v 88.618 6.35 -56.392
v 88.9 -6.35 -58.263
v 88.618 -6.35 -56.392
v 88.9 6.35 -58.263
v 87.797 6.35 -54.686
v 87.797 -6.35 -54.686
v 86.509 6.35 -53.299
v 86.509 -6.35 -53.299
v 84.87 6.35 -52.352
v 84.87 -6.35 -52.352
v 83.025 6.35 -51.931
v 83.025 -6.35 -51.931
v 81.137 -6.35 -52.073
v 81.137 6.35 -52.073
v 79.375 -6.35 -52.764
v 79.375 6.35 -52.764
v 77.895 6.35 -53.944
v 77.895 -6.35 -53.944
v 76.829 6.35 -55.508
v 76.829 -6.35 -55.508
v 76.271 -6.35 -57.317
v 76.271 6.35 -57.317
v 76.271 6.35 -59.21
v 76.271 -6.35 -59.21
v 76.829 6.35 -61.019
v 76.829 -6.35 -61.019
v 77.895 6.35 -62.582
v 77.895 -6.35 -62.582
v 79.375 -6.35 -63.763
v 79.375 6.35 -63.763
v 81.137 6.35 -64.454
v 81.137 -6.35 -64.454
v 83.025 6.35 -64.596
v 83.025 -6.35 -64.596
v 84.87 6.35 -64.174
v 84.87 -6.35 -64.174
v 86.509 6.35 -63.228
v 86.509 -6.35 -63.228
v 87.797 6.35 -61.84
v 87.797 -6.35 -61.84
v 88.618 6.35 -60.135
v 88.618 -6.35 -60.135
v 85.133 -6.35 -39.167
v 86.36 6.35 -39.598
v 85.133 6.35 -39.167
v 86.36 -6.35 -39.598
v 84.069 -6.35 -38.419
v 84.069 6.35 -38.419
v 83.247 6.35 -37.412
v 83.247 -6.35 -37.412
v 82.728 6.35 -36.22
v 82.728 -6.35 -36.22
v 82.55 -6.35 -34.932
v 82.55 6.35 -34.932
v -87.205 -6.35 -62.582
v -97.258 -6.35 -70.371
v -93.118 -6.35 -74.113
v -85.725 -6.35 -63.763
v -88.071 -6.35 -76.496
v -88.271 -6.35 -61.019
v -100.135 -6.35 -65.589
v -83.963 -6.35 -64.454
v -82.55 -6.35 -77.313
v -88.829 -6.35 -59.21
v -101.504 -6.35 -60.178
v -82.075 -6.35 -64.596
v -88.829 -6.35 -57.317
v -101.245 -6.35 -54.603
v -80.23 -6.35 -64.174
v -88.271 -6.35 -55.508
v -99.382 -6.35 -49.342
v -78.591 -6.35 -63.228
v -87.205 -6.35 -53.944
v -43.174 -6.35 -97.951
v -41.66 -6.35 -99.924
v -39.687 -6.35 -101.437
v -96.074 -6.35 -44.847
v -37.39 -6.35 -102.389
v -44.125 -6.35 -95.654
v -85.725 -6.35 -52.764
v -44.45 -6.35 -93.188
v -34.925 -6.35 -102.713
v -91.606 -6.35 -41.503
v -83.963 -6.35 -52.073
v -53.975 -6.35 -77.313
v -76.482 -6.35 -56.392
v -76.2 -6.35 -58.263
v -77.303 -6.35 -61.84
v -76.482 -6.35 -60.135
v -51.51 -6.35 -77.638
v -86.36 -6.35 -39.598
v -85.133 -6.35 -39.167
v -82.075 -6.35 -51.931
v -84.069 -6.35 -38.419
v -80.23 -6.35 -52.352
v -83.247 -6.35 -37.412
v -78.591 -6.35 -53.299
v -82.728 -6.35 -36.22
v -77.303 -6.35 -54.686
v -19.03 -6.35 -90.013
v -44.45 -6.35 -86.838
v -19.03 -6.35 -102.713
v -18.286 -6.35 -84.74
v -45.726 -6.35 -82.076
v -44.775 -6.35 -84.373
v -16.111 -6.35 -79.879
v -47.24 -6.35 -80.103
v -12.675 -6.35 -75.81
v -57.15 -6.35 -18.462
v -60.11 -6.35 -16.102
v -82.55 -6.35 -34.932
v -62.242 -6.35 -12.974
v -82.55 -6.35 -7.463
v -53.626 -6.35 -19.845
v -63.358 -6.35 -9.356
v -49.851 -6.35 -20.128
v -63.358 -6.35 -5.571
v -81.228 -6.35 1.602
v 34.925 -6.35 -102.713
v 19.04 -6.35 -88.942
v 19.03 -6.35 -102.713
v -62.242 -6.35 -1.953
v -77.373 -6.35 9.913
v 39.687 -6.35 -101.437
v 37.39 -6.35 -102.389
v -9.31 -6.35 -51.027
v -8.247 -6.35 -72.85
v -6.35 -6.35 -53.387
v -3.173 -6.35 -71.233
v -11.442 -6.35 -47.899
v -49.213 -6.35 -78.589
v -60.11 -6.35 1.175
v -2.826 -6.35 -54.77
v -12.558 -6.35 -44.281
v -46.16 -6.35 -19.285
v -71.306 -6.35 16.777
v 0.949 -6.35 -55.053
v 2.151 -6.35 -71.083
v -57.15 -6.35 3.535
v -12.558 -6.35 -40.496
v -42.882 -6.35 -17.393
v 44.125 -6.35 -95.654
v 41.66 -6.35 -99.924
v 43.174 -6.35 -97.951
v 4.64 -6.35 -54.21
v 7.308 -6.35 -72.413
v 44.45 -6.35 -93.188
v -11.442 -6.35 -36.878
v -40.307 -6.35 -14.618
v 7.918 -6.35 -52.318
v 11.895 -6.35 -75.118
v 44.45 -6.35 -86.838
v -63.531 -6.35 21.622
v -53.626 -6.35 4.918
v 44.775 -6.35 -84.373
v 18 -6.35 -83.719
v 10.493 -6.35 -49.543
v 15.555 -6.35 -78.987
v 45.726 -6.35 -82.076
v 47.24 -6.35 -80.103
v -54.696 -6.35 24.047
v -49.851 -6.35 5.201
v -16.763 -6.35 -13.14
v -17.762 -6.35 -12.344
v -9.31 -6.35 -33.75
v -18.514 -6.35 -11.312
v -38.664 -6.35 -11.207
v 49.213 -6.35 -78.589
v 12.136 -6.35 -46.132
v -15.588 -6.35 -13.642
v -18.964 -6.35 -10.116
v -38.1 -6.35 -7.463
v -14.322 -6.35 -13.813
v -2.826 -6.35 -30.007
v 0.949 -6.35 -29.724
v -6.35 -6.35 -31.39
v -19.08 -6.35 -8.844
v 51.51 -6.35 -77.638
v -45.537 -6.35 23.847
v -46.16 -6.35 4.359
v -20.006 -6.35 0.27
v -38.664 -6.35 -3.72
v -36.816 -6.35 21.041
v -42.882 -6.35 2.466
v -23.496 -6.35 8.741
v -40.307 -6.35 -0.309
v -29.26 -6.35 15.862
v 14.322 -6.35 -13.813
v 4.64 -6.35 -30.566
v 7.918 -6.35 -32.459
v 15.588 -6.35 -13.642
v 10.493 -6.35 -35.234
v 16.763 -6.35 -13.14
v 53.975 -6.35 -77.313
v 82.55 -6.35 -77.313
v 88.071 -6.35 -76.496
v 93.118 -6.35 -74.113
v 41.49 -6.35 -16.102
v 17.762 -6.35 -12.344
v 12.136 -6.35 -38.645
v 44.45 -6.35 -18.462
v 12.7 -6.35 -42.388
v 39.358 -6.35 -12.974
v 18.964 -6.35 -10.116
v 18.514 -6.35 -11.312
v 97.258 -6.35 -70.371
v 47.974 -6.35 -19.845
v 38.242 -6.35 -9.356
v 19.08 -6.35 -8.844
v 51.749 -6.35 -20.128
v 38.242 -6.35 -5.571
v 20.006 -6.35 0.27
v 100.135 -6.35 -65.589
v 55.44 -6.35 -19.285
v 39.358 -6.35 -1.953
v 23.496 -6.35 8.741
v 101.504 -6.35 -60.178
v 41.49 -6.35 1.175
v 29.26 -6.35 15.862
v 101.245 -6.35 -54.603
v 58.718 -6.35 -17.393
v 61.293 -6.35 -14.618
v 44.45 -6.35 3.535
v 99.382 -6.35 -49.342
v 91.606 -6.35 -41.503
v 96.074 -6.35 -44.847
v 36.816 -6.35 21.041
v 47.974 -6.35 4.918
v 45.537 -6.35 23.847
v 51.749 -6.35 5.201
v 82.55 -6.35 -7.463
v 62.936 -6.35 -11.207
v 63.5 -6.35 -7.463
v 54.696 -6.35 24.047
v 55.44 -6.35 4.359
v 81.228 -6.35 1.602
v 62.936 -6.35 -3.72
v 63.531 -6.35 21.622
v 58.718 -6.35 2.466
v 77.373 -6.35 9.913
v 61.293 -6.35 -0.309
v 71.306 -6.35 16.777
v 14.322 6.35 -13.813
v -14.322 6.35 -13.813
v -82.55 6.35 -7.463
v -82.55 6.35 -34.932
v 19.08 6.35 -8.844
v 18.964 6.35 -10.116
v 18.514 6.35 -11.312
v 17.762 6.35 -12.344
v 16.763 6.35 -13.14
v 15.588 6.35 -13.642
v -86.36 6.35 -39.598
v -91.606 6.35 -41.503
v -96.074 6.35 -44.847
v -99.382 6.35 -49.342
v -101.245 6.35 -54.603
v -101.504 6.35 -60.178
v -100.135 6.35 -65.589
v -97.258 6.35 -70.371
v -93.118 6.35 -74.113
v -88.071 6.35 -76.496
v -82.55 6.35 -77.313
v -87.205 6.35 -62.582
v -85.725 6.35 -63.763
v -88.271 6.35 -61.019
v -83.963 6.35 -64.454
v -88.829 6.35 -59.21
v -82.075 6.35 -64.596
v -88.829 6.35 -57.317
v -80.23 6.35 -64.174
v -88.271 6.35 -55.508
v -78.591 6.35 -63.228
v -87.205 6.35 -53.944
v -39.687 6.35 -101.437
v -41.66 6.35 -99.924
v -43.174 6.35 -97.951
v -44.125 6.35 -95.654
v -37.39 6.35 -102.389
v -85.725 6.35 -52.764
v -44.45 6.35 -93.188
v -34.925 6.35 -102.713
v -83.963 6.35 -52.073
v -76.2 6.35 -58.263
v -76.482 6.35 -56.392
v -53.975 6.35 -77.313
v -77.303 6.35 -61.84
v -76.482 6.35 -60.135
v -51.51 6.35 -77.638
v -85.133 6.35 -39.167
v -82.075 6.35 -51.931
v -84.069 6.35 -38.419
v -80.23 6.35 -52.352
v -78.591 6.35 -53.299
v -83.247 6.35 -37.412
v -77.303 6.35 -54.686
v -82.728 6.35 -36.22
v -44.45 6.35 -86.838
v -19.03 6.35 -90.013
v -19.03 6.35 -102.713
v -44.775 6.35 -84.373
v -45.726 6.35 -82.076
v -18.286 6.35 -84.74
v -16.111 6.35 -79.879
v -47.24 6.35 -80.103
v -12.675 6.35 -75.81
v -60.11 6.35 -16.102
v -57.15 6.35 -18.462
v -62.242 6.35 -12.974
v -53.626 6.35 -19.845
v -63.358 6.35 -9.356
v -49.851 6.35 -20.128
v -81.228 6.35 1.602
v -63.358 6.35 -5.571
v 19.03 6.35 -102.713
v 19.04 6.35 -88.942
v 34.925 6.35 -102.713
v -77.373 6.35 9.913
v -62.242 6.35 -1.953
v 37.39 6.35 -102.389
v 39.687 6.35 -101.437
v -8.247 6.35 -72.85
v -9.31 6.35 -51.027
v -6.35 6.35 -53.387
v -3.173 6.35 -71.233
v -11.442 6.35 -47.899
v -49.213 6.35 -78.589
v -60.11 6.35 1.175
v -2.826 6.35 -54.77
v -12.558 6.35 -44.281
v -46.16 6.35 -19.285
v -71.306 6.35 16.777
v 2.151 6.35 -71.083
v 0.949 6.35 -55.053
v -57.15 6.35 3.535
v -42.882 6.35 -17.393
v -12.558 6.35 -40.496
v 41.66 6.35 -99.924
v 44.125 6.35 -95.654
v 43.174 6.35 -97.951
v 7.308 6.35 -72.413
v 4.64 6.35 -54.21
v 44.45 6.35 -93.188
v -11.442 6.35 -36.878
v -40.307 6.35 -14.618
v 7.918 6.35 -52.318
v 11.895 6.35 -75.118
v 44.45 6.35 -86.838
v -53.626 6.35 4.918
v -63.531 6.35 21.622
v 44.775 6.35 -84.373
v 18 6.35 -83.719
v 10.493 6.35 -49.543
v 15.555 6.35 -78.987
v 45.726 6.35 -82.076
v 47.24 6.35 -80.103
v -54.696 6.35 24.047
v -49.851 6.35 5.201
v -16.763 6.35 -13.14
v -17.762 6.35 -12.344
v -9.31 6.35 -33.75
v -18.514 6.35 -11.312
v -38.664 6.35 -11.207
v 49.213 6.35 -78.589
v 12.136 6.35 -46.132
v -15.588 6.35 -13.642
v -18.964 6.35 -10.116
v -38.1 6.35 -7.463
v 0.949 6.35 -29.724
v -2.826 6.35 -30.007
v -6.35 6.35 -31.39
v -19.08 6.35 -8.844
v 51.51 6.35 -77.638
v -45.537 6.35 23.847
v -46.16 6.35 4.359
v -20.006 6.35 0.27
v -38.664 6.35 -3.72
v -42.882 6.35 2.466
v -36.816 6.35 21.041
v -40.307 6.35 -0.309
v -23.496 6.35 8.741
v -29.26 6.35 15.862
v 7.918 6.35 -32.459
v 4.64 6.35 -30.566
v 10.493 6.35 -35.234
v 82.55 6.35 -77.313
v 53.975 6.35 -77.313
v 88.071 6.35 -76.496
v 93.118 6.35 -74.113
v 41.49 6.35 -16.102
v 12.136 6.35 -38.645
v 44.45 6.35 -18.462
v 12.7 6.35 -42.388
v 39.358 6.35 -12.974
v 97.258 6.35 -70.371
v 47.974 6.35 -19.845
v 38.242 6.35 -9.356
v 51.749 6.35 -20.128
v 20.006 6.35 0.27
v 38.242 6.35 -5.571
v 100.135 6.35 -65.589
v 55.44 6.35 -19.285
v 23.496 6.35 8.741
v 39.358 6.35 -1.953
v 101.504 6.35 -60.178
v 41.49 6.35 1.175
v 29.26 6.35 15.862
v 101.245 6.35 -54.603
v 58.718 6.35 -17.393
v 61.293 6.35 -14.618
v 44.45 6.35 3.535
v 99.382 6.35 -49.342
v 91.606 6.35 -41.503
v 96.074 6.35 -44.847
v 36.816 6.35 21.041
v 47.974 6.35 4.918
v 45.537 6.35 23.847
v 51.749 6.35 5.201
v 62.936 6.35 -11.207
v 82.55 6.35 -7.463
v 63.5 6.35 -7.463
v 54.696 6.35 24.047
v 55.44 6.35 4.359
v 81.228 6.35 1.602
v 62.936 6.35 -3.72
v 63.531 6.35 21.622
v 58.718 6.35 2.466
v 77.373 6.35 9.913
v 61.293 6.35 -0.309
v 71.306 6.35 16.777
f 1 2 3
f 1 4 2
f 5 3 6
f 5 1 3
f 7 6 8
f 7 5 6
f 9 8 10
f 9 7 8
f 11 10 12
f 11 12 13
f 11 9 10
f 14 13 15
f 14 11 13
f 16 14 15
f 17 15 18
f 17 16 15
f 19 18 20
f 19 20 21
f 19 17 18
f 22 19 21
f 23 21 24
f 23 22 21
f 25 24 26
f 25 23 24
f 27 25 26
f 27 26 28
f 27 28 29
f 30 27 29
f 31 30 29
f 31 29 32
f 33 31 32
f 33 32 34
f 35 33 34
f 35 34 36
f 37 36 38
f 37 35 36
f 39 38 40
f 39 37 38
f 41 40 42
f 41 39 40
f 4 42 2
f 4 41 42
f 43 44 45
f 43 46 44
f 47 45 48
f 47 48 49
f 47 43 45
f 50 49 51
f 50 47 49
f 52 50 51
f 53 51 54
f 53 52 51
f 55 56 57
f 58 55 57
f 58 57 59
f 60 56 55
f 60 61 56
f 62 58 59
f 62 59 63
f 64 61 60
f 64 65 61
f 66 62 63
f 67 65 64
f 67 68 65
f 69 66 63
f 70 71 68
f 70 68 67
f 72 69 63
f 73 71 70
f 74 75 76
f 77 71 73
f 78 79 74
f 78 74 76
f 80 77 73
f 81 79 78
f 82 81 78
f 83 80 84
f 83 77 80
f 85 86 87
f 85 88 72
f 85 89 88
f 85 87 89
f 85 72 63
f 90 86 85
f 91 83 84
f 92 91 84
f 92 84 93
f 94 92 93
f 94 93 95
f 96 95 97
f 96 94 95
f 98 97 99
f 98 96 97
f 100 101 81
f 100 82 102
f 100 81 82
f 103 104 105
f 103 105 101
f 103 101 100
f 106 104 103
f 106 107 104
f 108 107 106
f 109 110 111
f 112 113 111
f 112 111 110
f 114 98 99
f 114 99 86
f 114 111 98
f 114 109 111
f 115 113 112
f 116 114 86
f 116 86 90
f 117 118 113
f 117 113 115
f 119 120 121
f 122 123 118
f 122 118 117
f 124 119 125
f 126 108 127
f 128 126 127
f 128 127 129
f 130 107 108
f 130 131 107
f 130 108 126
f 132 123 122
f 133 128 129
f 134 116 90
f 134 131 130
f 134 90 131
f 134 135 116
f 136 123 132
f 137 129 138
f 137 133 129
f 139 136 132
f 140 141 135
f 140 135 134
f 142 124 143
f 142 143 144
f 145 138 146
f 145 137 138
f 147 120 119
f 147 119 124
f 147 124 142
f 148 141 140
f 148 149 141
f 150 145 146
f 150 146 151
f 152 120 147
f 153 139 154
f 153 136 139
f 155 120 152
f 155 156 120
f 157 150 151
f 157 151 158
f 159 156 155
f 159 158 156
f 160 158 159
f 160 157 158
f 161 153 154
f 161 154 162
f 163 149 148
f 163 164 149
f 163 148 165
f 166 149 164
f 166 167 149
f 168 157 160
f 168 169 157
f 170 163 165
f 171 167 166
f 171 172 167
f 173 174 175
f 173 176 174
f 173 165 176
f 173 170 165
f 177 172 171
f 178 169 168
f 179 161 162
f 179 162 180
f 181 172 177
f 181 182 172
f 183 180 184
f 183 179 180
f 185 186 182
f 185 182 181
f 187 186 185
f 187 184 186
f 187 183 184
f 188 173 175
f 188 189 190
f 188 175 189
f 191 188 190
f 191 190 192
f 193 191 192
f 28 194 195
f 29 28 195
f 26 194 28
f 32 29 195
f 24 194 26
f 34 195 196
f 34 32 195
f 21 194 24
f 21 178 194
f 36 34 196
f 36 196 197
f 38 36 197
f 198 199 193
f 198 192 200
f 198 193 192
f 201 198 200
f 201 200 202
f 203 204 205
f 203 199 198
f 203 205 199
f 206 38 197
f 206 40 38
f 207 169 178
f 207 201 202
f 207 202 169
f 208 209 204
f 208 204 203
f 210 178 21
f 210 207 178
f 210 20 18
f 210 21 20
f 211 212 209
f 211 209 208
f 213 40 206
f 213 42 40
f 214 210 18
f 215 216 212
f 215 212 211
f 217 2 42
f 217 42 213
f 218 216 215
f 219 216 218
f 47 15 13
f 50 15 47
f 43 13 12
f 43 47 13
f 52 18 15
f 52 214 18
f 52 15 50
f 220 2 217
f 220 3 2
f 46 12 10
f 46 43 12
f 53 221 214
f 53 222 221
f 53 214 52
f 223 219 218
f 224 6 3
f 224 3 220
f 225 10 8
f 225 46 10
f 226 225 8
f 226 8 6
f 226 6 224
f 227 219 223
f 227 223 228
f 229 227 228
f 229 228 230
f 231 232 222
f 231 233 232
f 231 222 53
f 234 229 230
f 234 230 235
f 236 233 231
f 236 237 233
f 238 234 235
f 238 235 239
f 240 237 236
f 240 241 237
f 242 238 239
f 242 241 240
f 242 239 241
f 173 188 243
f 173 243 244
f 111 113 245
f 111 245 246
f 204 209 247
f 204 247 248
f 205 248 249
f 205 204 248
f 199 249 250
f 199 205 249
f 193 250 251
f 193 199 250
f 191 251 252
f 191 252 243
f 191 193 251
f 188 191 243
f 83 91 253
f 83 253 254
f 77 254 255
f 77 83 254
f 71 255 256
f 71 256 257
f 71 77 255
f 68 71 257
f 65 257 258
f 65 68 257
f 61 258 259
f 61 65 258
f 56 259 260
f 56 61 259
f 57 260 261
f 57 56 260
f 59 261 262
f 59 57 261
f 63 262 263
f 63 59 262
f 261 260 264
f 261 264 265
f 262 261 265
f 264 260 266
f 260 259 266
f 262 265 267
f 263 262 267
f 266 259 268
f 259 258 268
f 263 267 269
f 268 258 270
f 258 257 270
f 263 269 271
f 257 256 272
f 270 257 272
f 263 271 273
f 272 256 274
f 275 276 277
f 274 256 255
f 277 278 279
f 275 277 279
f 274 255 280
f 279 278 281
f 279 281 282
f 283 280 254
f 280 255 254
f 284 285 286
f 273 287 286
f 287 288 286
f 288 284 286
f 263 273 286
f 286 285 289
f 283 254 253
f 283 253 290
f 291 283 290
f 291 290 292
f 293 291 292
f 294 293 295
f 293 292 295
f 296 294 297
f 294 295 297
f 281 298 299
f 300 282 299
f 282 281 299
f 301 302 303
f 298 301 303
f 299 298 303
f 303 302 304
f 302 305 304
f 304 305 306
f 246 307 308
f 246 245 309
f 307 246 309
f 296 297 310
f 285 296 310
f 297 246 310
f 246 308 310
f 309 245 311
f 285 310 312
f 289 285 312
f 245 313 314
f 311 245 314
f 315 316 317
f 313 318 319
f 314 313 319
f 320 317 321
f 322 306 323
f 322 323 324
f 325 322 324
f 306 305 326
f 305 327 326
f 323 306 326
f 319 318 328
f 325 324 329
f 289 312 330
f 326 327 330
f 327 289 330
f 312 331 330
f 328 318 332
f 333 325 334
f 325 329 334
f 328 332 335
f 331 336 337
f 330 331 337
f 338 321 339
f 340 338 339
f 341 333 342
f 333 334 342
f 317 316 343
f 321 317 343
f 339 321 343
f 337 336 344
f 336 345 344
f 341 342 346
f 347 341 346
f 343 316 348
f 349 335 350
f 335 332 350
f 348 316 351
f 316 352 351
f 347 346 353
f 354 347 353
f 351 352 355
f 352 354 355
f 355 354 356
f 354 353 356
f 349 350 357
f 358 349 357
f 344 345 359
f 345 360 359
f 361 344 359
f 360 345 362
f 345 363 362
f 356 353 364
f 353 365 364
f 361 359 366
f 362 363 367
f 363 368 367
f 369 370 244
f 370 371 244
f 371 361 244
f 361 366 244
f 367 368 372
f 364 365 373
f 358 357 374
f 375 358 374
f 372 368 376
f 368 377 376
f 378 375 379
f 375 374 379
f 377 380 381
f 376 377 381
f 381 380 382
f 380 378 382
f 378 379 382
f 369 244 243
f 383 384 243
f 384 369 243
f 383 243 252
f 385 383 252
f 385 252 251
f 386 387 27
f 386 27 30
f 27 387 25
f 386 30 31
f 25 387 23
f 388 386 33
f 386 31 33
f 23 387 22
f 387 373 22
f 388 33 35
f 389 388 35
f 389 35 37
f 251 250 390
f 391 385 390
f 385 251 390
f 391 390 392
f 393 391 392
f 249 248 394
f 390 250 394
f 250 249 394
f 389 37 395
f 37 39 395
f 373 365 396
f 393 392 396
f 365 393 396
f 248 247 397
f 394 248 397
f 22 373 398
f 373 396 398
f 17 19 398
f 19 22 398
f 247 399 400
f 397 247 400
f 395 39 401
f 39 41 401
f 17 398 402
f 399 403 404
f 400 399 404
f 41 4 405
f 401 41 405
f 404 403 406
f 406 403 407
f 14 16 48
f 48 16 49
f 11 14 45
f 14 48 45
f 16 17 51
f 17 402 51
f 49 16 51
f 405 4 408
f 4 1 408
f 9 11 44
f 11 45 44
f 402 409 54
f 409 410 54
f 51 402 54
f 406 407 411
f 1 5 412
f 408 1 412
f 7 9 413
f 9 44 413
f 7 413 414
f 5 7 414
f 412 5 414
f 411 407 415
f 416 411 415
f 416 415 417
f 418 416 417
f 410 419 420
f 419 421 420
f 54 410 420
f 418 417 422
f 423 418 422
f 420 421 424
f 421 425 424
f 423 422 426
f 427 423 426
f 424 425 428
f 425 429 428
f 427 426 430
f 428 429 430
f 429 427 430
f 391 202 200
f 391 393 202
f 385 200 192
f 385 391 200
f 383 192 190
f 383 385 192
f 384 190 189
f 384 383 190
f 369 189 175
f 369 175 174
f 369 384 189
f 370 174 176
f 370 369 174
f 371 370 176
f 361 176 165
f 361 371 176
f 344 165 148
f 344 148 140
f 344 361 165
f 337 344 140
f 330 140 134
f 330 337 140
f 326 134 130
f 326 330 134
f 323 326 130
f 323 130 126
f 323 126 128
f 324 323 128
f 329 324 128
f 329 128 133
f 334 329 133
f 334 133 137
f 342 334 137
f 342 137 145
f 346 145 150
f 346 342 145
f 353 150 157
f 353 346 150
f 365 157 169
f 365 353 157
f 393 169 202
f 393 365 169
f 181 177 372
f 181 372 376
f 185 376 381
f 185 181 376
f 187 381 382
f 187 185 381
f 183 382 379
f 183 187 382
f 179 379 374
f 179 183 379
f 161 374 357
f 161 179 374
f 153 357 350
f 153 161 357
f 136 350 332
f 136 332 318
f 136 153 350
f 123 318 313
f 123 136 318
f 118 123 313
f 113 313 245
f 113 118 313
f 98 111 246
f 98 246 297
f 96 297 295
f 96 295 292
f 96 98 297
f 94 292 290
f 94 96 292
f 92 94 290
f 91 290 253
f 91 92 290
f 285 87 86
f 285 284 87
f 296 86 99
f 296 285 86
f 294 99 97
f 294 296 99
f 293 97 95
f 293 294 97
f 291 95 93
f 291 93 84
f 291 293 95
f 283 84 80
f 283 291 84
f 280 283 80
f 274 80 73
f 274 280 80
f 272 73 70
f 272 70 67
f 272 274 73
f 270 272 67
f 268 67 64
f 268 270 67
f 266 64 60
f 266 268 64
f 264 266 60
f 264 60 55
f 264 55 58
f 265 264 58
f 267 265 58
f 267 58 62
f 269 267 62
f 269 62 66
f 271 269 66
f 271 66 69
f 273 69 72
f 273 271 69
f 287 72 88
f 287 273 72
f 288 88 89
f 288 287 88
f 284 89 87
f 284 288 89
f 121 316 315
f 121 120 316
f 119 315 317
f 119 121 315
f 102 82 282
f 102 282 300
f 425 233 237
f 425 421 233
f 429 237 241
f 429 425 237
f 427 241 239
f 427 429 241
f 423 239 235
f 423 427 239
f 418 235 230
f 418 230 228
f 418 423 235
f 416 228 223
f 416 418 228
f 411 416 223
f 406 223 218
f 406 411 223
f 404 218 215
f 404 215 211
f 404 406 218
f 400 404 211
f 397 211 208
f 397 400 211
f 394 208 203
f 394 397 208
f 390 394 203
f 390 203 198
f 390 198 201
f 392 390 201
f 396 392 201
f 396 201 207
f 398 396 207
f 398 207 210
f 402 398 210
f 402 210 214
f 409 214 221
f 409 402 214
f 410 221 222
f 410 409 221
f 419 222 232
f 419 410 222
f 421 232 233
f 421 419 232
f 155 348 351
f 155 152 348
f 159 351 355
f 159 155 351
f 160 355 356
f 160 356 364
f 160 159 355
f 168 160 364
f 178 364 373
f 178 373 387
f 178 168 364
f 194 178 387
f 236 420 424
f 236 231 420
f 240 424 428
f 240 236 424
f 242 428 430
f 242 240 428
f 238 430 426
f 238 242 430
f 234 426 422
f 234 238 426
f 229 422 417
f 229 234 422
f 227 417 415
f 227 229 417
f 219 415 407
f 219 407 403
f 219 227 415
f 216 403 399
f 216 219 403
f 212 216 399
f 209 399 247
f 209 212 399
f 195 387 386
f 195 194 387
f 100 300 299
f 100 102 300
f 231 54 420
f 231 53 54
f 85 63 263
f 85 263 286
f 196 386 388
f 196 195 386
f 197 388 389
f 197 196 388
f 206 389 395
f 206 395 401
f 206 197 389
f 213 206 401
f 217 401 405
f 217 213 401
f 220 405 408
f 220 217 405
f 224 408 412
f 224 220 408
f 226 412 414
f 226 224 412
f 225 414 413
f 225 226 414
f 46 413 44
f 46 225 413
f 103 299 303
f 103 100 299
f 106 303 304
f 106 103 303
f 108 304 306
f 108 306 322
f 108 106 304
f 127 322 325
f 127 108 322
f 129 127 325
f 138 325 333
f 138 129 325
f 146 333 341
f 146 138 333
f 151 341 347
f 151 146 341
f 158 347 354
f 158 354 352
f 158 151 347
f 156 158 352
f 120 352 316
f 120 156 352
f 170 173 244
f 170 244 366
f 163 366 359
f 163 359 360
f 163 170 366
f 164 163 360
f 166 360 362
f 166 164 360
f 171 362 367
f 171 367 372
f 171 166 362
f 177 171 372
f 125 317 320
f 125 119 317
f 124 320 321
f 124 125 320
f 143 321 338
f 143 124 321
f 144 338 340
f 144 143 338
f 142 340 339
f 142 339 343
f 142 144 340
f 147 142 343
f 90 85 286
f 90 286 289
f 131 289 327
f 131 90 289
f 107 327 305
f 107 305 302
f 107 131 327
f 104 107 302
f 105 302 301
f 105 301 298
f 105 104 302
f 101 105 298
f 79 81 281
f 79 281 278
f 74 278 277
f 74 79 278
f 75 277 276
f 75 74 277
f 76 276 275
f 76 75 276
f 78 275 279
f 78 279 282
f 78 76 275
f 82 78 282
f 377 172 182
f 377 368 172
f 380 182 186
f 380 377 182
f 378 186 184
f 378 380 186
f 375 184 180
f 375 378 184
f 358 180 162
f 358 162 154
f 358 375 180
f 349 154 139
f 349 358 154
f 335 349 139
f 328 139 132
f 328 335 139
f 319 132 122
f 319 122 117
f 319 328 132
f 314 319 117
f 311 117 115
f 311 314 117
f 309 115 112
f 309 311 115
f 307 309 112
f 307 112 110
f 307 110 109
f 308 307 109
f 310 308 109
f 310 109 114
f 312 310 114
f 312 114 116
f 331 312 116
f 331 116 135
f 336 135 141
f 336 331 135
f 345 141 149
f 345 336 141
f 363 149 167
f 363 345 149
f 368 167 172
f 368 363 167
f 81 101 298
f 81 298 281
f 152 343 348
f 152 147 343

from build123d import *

# Parameters (mm, degrees)
F0_R     = 7.9375
F0_R_2   = 12.7
F0_R_3   = 6.35
F1_DEPTH = 6.35


with BuildPart() as f1:
    # F0 (on Front) → F1 (new body, symmetric)
    with BuildSketch(Plane.XZ):
        with BuildLine():
            ThreePointArc((82.55, -7.463384), (50.109619, 24.279109), (19.080024, -8.843819))
            ThreePointArc((19.080024, -8.843819), (17.762053, -12.344458), (14.322027, -13.813384))
            Line((14.322027, -13.813384), (0, -13.813384))
            Line((0, -13.813384), (-14.322027, -13.813384))
            ThreePointArc((-14.322027, -13.813384), (-17.762053, -12.344458), (-19.080024, -8.843819))
            ThreePointArc((-19.080024, -8.843819), (-50.109619, 24.279109), (-82.55, -7.463384))
            Line((-82.55, -7.463384), (-82.55, -34.931994))
            ThreePointArc((-82.55, -34.931994), (-83.623483, -37.944063), (-86.36, -39.598272))
            ThreePointArc((-86.36, -39.598272), (-101.503534, -60.17808), (-82.55, -77.313384))
            Line((-82.55, -77.313384), (-53.975, -77.313384))
            ThreePointArc((-53.975, -77.313384), (-47.239808, -80.103192), (-44.45, -86.838384))
            Line((-44.45, -86.838384), (-44.45, -93.188384))
            ThreePointArc((-44.45, -93.188384), (-41.660192, -99.923576), (-34.925, -102.713384))
            Line((-34.925, -102.713384), (-19.030211, -102.713384))
            Line((-19.030211, -102.713384), (-19.030211, -90.013384))
            ThreePointArc((-19.030211, -90.013384), (-0.516209, -70.970926), (19.039627, -88.941812))
            Line((19.039627, -88.941812), (19.030211, -102.713384))
            Line((19.030211, -102.713384), (34.925, -102.713384))
            ThreePointArc((34.925, -102.713384), (41.660192, -99.923576), (44.45, -93.188384))
            Line((44.45, -93.188384), (44.45, -86.838384))
            ThreePointArc((44.45, -86.838384), (47.239808, -80.103192), (53.975, -77.313384))
            Line((53.975, -77.313384), (82.55, -77.313384))
            ThreePointArc((82.55, -77.313384), (101.503534, -60.17808), (86.36, -39.598272))
            ThreePointArc((86.36, -39.598272), (83.623483, -37.944063), (82.55, -34.931994))
            Line((82.55, -34.931994), (82.55, -7.463384))
        make_face()
        with Locations((-82.55, -58.263384)):
            Circle(F0_R, mode=Mode.SUBTRACT)
        with Locations((0, -42.388384)):
            Circle(F0_R_2, mode=Mode.SUBTRACT)
        with Locations((82.55, -58.263384)):
            Circle(F0_R, mode=Mode.SUBTRACT)
        with Locations((-50.8, -7.463384)):
            Circle(F0_R_2, mode=Mode.SUBTRACT)
        with Locations((50.8, -7.463384)):
            Circle(F0_R_2, mode=Mode.SUBTRACT)
        with Locations((82.55, -58.263384)):
            Circle(F0_R)
        with Locations((82.55, -58.263384)):
            Circle(F0_R_3, mode=Mode.SUBTRACT)
        with Locations((-82.55, -58.263384)):
            Circle(F0_R)
        with Locations((-82.55, -58.263384)):
            Circle(F0_R_3, mode=Mode.SUBTRACT)
    extrude(amount=F1_DEPTH, both=True)


solid = f1.part
